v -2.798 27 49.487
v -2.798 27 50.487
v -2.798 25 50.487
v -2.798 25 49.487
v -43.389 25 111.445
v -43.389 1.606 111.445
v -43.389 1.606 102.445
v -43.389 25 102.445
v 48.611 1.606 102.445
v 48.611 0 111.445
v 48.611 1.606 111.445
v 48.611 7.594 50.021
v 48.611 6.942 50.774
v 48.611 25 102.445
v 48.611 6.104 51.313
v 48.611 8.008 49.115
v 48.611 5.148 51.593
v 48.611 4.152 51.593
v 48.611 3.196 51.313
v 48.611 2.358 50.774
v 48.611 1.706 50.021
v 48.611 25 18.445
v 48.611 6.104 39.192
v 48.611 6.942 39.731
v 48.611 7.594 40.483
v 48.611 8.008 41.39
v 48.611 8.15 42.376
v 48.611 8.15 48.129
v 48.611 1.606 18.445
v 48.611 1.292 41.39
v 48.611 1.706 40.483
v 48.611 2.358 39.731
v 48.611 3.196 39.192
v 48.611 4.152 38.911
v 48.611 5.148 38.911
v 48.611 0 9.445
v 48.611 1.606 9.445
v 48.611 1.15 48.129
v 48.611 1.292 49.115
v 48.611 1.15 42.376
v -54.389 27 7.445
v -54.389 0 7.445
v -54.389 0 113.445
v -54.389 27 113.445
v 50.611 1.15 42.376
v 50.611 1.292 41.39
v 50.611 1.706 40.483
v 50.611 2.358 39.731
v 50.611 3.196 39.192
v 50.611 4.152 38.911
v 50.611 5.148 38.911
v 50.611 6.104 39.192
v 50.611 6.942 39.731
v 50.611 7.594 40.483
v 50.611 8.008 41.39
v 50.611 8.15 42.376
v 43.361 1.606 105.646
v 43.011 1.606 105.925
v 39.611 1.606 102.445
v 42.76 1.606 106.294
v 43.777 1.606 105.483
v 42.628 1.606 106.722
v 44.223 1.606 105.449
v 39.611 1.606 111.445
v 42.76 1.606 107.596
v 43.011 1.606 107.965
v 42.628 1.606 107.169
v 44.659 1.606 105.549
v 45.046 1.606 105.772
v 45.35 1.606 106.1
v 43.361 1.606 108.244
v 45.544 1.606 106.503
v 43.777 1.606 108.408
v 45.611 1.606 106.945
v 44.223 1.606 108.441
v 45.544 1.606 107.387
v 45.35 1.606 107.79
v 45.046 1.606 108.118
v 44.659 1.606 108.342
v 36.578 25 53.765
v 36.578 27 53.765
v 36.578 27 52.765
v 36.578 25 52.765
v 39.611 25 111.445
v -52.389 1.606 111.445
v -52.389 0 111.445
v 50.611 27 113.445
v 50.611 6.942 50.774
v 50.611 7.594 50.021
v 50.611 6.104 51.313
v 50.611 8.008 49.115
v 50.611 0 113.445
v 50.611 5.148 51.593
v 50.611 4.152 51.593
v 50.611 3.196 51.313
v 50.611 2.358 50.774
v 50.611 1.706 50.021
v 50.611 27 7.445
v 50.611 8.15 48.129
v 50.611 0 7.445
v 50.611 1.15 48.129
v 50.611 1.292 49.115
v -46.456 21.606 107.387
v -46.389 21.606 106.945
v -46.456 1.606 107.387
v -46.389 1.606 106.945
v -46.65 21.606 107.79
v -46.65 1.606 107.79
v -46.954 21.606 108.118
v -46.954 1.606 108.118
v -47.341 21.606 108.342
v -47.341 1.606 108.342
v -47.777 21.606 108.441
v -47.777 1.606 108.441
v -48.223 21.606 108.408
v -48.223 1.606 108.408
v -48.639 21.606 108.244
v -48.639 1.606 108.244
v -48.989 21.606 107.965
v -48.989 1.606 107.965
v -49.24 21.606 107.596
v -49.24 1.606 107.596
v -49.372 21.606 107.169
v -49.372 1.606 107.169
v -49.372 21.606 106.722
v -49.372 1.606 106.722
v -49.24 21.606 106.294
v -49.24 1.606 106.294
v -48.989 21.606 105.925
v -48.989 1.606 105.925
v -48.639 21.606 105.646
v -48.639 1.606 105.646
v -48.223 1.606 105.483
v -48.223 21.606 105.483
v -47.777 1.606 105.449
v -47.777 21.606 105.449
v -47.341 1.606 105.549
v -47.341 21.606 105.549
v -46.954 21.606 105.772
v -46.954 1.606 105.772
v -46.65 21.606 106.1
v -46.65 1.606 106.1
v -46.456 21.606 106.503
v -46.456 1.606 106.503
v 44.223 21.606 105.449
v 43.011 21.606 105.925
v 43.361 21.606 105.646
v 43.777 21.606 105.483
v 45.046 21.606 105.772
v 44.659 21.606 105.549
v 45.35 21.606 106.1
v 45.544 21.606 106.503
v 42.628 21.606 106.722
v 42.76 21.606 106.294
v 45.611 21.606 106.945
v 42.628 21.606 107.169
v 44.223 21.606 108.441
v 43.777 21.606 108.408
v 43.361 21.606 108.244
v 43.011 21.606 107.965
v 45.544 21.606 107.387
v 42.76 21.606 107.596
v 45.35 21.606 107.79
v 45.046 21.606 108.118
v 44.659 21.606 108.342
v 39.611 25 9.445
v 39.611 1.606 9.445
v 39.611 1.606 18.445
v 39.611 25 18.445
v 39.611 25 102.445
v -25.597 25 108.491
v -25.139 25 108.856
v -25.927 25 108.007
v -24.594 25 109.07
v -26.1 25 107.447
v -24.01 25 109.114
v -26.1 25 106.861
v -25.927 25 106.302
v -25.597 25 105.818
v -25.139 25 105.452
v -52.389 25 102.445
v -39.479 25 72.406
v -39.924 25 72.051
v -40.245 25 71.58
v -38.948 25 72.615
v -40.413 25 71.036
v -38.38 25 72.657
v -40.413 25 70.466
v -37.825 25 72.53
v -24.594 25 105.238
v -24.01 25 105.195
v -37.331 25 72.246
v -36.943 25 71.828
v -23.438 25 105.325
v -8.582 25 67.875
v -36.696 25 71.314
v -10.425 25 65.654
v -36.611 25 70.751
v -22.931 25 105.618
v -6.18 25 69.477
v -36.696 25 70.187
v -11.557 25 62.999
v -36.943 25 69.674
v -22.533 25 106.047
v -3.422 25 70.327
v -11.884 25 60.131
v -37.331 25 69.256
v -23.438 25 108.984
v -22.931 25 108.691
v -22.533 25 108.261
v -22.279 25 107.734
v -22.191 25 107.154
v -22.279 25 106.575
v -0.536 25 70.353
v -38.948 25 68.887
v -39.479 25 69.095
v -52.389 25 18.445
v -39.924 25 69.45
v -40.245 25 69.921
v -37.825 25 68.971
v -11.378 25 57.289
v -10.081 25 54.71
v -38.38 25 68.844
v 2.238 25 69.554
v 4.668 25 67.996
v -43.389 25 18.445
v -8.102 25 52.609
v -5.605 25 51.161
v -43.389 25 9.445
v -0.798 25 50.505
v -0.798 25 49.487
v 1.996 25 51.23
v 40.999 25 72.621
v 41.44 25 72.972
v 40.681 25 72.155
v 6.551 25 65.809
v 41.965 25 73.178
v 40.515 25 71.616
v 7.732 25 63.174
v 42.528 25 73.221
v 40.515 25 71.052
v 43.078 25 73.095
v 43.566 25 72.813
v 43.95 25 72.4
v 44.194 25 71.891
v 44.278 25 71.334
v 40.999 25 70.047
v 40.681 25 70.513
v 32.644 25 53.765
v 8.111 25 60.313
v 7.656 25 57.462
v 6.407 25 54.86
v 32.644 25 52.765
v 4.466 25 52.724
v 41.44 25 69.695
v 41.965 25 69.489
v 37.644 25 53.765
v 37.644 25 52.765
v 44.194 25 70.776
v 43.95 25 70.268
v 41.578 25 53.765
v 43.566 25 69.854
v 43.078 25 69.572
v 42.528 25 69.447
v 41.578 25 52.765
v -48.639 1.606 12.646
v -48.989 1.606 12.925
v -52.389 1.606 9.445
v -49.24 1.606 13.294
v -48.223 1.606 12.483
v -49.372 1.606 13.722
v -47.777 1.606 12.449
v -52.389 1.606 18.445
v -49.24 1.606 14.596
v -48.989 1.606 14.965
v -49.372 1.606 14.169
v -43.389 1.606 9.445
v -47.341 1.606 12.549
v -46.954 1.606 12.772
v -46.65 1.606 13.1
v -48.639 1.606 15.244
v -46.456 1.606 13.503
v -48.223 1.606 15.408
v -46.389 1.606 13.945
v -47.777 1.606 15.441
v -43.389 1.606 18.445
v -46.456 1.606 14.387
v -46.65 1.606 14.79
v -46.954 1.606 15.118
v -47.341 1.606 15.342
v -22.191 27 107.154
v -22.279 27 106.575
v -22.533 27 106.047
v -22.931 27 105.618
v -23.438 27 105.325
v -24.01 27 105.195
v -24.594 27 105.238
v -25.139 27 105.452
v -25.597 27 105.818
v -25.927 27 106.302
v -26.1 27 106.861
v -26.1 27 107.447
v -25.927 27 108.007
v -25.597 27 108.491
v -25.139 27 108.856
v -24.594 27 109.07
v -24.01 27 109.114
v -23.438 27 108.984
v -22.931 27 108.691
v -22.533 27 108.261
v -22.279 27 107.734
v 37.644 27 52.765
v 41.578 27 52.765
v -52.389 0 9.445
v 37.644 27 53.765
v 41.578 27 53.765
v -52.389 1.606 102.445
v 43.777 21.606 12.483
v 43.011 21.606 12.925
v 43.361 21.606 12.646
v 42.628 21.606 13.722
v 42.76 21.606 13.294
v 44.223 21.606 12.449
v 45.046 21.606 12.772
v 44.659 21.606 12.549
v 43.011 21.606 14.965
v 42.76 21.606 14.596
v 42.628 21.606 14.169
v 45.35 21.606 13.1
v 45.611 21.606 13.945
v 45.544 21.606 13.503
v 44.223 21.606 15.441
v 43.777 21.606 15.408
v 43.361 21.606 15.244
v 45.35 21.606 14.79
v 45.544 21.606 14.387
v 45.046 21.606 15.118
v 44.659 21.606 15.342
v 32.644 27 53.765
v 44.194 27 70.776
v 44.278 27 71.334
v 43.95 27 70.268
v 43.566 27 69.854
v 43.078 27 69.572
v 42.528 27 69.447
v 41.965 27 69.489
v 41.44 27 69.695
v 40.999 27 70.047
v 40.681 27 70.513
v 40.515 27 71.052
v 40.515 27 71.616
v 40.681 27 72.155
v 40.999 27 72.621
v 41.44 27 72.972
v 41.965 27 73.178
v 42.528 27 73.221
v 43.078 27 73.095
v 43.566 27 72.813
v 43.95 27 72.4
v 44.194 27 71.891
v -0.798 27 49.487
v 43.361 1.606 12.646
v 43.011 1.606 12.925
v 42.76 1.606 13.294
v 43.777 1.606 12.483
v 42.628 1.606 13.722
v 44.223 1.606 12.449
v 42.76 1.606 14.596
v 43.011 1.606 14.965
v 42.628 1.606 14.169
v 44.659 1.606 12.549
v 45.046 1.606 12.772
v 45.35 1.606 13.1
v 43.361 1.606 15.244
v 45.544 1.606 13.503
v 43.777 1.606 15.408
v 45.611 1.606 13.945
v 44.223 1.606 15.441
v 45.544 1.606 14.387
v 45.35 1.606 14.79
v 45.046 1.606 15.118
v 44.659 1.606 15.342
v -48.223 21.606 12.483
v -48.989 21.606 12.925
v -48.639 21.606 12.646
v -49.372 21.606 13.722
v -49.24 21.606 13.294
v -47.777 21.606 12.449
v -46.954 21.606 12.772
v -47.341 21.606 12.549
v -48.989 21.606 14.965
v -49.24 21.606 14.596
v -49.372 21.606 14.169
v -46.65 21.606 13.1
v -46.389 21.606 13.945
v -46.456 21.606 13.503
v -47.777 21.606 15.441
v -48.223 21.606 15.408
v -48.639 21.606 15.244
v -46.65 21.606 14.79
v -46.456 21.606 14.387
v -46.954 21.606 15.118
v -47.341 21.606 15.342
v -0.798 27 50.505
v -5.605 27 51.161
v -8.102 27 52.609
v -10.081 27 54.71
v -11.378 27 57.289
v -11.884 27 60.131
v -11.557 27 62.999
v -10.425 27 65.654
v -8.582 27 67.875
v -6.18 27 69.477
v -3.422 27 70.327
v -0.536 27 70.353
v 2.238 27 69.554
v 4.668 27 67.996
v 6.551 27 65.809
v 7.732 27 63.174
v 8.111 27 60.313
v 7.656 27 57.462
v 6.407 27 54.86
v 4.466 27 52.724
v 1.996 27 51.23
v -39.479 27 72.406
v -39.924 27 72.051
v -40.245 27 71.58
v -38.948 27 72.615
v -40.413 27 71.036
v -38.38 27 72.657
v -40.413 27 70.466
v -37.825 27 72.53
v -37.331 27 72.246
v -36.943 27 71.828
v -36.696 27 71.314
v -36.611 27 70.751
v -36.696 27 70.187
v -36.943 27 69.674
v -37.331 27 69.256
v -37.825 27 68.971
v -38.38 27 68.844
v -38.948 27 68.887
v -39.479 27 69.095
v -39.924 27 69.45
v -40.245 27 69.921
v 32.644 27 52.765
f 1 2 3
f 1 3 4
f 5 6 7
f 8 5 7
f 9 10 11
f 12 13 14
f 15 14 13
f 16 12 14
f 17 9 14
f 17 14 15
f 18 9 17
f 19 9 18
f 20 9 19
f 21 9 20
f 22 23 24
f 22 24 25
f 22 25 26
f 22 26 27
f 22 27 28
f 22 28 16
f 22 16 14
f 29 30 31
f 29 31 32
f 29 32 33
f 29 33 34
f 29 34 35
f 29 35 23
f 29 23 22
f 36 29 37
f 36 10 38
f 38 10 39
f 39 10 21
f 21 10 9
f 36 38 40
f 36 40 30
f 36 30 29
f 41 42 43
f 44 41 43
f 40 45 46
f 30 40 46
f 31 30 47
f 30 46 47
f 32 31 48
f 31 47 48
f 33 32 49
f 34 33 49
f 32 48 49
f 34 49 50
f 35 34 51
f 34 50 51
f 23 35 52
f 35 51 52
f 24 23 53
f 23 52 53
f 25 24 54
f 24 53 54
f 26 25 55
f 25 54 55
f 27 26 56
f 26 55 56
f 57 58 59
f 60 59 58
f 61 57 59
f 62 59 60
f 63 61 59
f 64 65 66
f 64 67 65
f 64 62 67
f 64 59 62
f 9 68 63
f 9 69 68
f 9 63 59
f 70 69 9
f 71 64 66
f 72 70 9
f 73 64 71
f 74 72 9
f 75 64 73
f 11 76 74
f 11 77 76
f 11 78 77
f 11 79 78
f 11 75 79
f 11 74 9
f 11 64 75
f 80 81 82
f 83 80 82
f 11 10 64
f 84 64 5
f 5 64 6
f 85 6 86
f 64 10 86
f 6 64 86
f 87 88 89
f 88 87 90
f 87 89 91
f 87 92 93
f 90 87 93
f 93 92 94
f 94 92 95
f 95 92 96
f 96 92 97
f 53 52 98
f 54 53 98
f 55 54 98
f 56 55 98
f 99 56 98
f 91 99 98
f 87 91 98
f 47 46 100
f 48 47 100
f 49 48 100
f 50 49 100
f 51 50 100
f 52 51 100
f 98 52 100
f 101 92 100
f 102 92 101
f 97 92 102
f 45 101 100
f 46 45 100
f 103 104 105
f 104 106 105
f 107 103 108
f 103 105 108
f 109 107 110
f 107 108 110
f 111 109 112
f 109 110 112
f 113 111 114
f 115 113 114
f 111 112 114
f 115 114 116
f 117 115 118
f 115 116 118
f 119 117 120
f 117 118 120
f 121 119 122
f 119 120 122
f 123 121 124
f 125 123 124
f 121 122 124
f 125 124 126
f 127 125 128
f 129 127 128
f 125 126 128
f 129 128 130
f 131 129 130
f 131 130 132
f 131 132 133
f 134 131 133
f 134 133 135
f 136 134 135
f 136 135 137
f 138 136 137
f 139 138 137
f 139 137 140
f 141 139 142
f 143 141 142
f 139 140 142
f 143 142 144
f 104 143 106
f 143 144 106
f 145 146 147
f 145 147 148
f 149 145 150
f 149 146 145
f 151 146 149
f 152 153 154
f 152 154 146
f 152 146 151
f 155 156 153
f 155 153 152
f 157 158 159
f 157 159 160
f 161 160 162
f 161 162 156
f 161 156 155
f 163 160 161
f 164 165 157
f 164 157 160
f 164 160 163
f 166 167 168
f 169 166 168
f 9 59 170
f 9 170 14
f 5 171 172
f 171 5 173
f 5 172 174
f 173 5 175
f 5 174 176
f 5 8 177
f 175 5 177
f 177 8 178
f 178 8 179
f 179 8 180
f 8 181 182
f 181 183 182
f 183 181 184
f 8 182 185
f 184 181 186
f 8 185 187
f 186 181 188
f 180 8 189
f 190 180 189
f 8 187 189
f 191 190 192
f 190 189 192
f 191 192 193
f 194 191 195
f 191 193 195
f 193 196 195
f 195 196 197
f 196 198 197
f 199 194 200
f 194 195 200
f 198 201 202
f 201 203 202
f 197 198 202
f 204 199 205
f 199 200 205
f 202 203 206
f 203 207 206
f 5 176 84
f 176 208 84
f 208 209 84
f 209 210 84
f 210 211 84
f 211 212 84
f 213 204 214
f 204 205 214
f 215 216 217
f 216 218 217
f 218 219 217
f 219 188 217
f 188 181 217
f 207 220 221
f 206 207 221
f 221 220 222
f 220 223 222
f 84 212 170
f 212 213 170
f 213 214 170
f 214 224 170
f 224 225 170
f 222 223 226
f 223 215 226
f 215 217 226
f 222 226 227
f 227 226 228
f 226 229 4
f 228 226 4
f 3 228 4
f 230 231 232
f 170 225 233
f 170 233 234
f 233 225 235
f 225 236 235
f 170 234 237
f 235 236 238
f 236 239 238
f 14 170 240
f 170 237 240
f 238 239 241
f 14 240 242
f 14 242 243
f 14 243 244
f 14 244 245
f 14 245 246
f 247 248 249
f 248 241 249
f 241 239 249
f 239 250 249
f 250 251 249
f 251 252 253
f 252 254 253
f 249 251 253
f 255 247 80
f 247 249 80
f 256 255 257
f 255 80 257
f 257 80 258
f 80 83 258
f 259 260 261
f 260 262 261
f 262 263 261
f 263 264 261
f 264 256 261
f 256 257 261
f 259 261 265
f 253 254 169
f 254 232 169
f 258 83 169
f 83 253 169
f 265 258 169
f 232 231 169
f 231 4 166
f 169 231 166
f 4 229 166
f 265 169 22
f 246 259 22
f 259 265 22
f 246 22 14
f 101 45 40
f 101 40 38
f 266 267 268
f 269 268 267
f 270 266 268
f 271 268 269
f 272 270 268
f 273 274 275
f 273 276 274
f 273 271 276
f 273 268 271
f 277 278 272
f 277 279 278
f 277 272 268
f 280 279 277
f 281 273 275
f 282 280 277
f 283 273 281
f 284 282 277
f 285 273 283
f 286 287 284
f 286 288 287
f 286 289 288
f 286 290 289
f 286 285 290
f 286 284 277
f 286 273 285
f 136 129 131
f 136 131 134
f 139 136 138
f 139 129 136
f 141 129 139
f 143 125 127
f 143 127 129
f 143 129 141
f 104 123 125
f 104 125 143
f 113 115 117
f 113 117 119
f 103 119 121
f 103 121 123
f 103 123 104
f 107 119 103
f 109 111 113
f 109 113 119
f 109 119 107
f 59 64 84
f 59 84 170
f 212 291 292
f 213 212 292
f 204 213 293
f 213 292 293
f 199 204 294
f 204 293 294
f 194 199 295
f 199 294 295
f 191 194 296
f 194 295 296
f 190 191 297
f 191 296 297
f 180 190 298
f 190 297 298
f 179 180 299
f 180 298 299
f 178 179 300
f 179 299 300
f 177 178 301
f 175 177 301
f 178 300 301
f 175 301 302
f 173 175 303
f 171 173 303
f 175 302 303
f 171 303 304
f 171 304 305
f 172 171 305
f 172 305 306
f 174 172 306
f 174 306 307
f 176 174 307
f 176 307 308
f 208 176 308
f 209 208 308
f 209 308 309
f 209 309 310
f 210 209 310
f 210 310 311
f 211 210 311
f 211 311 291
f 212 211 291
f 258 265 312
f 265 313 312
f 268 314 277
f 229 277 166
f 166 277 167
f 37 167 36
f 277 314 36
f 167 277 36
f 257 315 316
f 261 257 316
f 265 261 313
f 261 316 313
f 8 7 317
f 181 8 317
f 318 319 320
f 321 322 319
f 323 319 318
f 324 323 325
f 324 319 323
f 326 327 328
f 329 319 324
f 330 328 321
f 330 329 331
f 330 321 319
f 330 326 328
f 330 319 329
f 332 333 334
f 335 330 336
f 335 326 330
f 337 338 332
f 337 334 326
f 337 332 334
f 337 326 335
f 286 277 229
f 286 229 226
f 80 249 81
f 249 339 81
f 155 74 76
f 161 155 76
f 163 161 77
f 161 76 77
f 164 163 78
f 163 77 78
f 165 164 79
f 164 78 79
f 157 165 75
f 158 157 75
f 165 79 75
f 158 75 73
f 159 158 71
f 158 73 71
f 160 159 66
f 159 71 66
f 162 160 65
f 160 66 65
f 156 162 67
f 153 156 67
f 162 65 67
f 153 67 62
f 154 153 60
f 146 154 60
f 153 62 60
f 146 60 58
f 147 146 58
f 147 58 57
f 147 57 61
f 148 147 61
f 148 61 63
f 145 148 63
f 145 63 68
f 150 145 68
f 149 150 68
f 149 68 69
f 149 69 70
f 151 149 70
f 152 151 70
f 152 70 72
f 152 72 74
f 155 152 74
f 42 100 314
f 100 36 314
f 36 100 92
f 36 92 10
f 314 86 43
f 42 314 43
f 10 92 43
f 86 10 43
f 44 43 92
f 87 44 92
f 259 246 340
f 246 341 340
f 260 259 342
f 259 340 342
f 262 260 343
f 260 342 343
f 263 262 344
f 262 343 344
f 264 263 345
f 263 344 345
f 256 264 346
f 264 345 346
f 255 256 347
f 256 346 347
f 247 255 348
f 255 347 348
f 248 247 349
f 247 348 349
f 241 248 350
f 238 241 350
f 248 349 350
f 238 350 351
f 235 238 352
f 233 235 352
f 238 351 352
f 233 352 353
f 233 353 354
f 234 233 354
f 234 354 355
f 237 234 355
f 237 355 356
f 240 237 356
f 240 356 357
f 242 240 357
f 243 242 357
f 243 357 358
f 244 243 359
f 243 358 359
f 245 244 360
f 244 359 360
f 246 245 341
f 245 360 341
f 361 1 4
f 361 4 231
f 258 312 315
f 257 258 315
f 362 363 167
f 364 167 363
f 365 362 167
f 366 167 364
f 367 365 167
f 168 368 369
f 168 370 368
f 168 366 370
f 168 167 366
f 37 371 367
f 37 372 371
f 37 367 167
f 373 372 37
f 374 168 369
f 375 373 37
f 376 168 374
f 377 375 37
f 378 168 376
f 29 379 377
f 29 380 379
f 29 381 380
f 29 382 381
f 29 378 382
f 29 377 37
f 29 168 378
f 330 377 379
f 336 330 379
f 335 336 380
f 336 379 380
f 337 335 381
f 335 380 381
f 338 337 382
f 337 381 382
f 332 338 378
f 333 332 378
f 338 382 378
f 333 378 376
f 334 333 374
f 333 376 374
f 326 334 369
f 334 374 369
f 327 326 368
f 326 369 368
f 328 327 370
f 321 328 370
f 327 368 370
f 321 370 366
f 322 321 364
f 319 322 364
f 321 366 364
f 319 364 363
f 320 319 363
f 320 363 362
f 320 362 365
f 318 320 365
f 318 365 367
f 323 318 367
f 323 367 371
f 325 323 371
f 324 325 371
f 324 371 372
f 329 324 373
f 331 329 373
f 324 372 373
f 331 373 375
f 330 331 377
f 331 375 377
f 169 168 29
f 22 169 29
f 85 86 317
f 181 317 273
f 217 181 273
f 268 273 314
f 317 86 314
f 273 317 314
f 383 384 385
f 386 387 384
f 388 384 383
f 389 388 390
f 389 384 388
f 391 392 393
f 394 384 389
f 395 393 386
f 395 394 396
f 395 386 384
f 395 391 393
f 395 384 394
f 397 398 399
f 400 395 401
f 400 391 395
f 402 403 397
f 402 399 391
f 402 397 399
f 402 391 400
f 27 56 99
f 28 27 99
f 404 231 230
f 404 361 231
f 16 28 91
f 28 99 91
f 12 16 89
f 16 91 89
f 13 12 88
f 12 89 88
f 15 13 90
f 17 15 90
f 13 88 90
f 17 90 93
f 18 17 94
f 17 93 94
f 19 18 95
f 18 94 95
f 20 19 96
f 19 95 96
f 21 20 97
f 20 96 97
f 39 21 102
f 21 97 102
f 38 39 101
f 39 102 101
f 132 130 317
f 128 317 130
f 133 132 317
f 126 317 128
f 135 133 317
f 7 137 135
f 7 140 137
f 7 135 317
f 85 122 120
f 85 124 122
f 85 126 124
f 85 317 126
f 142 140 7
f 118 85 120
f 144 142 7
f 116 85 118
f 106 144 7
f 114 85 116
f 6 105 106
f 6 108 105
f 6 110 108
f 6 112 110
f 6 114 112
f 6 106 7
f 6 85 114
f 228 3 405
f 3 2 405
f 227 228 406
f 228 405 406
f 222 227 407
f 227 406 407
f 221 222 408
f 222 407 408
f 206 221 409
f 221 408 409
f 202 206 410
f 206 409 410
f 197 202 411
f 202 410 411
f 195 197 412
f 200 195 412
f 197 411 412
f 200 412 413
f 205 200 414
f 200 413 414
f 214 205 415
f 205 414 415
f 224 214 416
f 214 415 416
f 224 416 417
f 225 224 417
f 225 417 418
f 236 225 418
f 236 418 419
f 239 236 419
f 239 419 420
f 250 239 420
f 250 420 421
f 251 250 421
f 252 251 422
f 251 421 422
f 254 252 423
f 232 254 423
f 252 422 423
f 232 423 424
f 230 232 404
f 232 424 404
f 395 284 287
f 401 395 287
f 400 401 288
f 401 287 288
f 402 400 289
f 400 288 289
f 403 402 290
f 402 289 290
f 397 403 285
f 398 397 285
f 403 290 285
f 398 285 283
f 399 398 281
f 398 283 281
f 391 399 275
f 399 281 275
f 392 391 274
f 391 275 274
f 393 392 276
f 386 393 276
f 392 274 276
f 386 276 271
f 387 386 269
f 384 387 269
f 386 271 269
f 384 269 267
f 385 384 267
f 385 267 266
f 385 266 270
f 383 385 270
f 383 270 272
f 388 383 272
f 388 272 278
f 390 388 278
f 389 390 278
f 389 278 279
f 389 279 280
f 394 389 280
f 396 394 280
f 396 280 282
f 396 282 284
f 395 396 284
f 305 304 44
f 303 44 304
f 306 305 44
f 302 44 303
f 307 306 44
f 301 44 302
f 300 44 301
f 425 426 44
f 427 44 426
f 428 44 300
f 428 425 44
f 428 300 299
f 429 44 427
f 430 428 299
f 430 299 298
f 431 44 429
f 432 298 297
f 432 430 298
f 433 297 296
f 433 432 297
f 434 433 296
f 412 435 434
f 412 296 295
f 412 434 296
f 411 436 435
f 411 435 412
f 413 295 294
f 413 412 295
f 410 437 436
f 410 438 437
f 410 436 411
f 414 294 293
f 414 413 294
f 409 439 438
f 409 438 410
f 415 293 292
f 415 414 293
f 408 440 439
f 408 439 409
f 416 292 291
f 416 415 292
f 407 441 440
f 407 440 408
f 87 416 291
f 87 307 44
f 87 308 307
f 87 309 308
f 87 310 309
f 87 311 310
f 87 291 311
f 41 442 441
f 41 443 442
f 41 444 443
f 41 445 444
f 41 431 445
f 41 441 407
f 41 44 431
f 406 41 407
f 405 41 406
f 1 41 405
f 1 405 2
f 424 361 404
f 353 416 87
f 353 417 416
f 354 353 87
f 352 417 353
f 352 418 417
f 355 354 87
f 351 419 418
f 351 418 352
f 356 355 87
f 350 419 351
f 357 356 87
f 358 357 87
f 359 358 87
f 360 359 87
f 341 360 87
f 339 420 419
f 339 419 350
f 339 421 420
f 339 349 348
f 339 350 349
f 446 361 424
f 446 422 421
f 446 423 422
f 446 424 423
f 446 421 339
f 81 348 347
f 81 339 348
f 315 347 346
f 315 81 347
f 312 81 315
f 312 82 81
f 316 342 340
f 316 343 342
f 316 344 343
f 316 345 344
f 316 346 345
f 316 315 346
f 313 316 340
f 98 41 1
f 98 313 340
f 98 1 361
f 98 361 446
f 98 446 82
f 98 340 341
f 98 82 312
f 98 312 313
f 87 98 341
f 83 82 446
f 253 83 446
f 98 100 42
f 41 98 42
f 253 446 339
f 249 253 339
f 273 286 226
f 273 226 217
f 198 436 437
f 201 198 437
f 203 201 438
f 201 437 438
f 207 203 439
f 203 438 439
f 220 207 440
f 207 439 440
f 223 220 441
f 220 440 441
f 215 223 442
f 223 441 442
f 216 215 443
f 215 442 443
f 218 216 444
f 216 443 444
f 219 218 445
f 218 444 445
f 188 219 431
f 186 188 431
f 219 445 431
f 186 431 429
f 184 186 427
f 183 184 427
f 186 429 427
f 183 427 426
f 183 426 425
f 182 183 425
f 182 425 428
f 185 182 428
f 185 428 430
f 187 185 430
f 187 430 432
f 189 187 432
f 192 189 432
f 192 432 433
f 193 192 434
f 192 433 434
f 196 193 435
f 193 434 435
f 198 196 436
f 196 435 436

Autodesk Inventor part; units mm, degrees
ref_plane "YZ Plane" through (0, 0, 0) normal (1, 0, 0) x (0, 1, 0)
ref_plane "XZ Plane" through (0, 0, 0) normal (0, 1, 0) x (-1, 0, 0)
ref_plane "XY Plane" through (0, 0, 0) normal (0, 0, 1) x (1, 0, 0)
sketch "Sketch1" plane through (0, 0, 0) normal (0, 1, 0) x (-1, 0, 0)
  line L0 (-48.611, 110.4452) -> (-48.611, 10.4452)
  line L1 (-48.611, 111.4452) -> (52.389, 111.4452)
  line L2 (52.389, 111.4452) -> (52.389, 9.4452)
  line L3 (52.389, 9.4452) -> (-48.611, 9.4452)
  line L4 (-48.611, 10.4452) -> (-48.611, 9.4452)
  line L5 (-48.611, 110.4452) -> (-48.611, 111.4452)
  line L6 (54.389, 7.4452) -> (54.389, 113.4452)
  line L7 (54.389, 113.4452) -> (-50.611, 113.4452)
  line L8 (-50.611, 113.4452) -> (-50.611, 110.4452)
  line L9 (-50.611, 110.4452) -> (-50.611, 10.4452)
  line L10 (-50.611, 10.4452) -> (-50.611, 7.4452)
  line L11 (-50.611, 7.4452) -> (54.389, 7.4452)
  point P0 (0, 0)
  dimension "d1" = 2
extrude "Extrusion1" add sketch "Sketch1" along normal blind 25
sketch "Sketch2" plane through (0, 25, 0) normal (0, 1, 0) x (1, 0, 0)
  line L0 (-54.389, -7.4452) -> (-54.389, -113.4452) projected
  line L1 (50.611, -113.4452) -> (50.611, -7.4452) projected
  line L2 (-54.389, -113.4452) -> (50.611, -113.4452)
  line L3 (50.611, -113.4452) -> (50.611, -7.4452)
  line L4 (50.611, -7.4452) -> (-54.389, -7.4452)
  line L5 (-54.389, -7.4452) -> (-54.389, -113.4452)
  point P0 (0, 0)
extrude "Extrusion2" add sketch "Sketch2" along normal blind 2
sketch "Sketch3" plane through (0, 25, 0) normal (0, -1, 0) x (1, 0, 0)
  line L0 (48.611, 9.4452) -> (48.611, 111.4452) projected
  line L1 (48.611, 111.4452) -> (-52.389, 111.4452) projected
  line L2 (-52.389, 111.4452) -> (-52.389, 9.4452) projected
  line L3 (-52.389, 9.4452) -> (48.611, 9.4452) projected
  line L4 (-52.389, 9.4452) -> (-43.389, 9.4452)
  line L5 (-43.389, 9.4452) -> (-43.389, 18.4452)
  line L6 (-43.389, 18.4452) -> (-52.389, 18.4452)
  line L7 (-52.389, 18.4452) -> (-52.389, 9.4452)
  line L8 (48.611, 9.4452) -> (39.611, 9.4452)
  line L9 (39.611, 9.4452) -> (39.611, 18.4452)
  line L10 (39.611, 18.4452) -> (48.611, 18.4452)
  line L11 (48.611, 18.4452) -> (48.611, 9.4452)
  line L12 (48.611, 111.4452) -> (39.611, 111.4452)
  line L13 (39.611, 111.4452) -> (39.611, 102.4452)
  line L14 (39.611, 102.4452) -> (48.611, 102.4452)
  line L15 (48.611, 102.4452) -> (48.611, 111.4452)
  line L16 (-52.389, 111.4452) -> (-43.389, 111.4452)
  line L17 (-43.389, 111.4452) -> (-43.389, 102.4452)
  line L18 (-43.389, 102.4452) -> (-52.389, 102.4452)
  line L19 (-52.389, 102.4452) -> (-52.389, 111.4452)
  point P0 (0, 0)
  dimension "d6" = 9
  dimension "d7" = 9
  dimension "d8" = 9
  dimension "d9" = 9
  dimension "d10" = 9
  dimension "d11" = 9
  dimension "d12" = 9
extrude "Extrusion3" add sketch "Sketch3" along normal blind 23.394 contours L3 L9 L10 L0 | L14 L13 L1 L0 | L3 L2 L6 L5 | L17 L18 L2 L1
sketch "Sketch4" plane through (0, 1.606, 0) normal (0, -1, 0) x (1, 0, 0)
  line L0 (-52.389, 9.4452) -> (-52.389, 18.4452) projected
  line L1 (-43.389, 9.4452) -> (-52.389, 9.4452) projected
  line L2 (-43.389, 9.4452) -> (-43.389, 18.4452) projected
  line L3 (-43.389, 18.4452) -> (-52.389, 18.4452) projected
  line L4 (-43.389, 102.4452) -> (-43.389, 111.4452) projected
  line L5 (-52.389, 111.4452) -> (-43.389, 111.4452) projected
  line L6 (-52.389, 102.4452) -> (-52.389, 111.4452) projected
  line L7 (-52.389, 102.4452) -> (-43.389, 102.4452) projected
  line L8 (48.611, 111.4452) -> (48.611, 102.4452) projected
  line L9 (39.611, 111.4452) -> (48.611, 111.4452) projected
  line L10 (39.611, 111.4452) -> (39.611, 102.4452) projected
  line L11 (39.611, 102.4452) -> (48.611, 102.4452) projected
  line L12 (39.611, 18.4452) -> (39.611, 9.4452) projected
  line L13 (48.611, 9.4452) -> (39.611, 9.4452) projected
  line L14 (48.611, 18.4452) -> (48.611, 9.4452) projected
  line L15 (48.611, 18.4452) -> (39.611, 18.4452) projected
  line L16 (-52.389, 102.4452) -> (-52.389, 18.4452) projected
  line L17 (39.611, 9.4452) -> (39.611, 18.4452) projected
  circle A0 centre (-47.889, 13.9452) radius 1.5
  circle A1 centre (-47.889, 106.9452) radius 1.5
  circle A2 centre (44.111, 106.9452) radius 1.5
  circle A3 centre (44.111, 13.9452) radius 1.5
  point P0 (0, 0)
  dimension "d15" = 3
  dimension "d16" = 3
  dimension "d17" = 3
  dimension "d18" = 3
extrude "Extrusion4" cut sketch "Sketch4" against normal blind 20 contours A0 | A1 | A2 | A3
sketch "Sketch5" plane through (50.611, 0, 113.4452) normal (1, 0, 0) x (0, 0, -1)
  line L0 (71.0695, 1.15) -> (65.3163, 1.15)
  line L1 (71.0695, 8.15) -> (65.3163, 8.15)
  arc A0 (65.3163, 8.15) -> (65.3163, 1.15) centre (65.3163, 4.65) ccw
  arc A1 (71.0695, 1.15) -> (71.0695, 8.15) centre (71.0695, 4.65) ccw
  line L2 (106, 0) -> (0, 0) projected
  point P0 (113.4452, 0)
extrude "Extrusion5" cut sketch "Sketch5" against normal blind 20
sketch "Sketch6" plane through (0, 27, 0) normal (0, 1, 0) x (1, 0, 0)
  line L0 (37.644, -52.7652) -> (37.644, -53.7652) projected
  line L1 (41.578, -53.7652) -> (41.578, -52.7652) projected
  line L2 (37.644, -53.7652) -> (41.578, -53.7652)
  line L3 (41.578, -53.7652) -> (41.578, -52.7652)
  line L4 (41.578, -52.7652) -> (37.644, -52.7652)
  line L5 (37.644, -52.7652) -> (37.644, -53.7652)
  point P0 (0, 0)
extrude "Extrusion6" cut sketch "Sketch6" against normal blind 20
sketch "Sketch7" plane through (0, 27, 0) normal (0, 1, 0) x (1, 0, 0)
  circle A0 centre (-24.1564, -107.1543) radius 1.9651 projected
  circle A1 centre (-38.523, -70.7508) radius 1.9118 projected
  circle A2 centre (42.3862, -71.3336) radius 1.8923 projected
  line L0 (32.644, -52.7652) -> (32.644, -53.7652) projected
  line L1 (36.578, -53.7652) -> (36.578, -52.7652) projected
  line L2 (32.644, -53.7652) -> (36.578, -53.7652)
  line L3 (36.578, -53.7652) -> (36.578, -52.7652)
  line L4 (36.578, -52.7652) -> (32.644, -52.7652)
  line L5 (32.644, -52.7652) -> (32.644, -53.7652)
  point P0 (0, 0)
extrude "Extrusion7" cut sketch "Sketch7" against normal blind 2
sketch "Sketch8" plane through (0, 27, 0) normal (0, 1, 0) x (1, 0, 0)
  circle A0 centre (42.3862, -71.3336) radius 1.8923 projected
  circle A1 centre (-24.1564, -107.1543) radius 1.9651 projected
  line L0 (32.644, -52.7652) -> (36.578, -52.7652) projected
  line L1 (36.578, -52.7652) -> (36.578, -53.7652) projected
  line L2 (36.578, -53.7652) -> (32.644, -53.7652) projected
  line L3 (32.644, -53.7652) -> (32.644, -52.7652) projected
  circle A2 centre (-38.523, -70.7508) radius 1.9118 projected
  line L4 (37.644, -52.7652) -> (41.578, -52.7652) projected
  line L5 (41.578, -52.7652) -> (41.578, -53.7652) projected
  line L6 (41.578, -53.7652) -> (37.644, -53.7652) projected
  line L7 (37.644, -53.7652) -> (37.644, -52.7652) projected
  line L8 (50.611, -113.4452) -> (50.611, -7.4452) projected
  line L9 (50.611, -7.4452) -> (-54.389, -7.4452) projected
  line L10 (-54.389, -7.4452) -> (-54.389, -113.4452) projected
  line L11 (-54.389, -113.4452) -> (50.611, -113.4452) projected
  line L12 (-54.389, -113.4452) -> (50.611, -113.4452) projected
  arc A3 (-2.7981, -50.4866) -> (-0.7981, -50.5048) centre (-1.889, -60.4452) ccw
  line L13 (-2.7981, -50.4866) -> (-2.7981, -49.4866)
  line L14 (-2.7981, -49.4866) -> (-0.7981, -49.4866)
  line L15 (-0.7981, -49.4866) -> (-0.7981, -50.5048)
  point P0 (0, 0)
  dimension "d37" = 1
  dimension "d38" = 2
extrude "Extrusion8" cut sketch "Sketch8" against normal blind 2 contours L13 L14 L15 A3
properties part number "Parte inferior"
